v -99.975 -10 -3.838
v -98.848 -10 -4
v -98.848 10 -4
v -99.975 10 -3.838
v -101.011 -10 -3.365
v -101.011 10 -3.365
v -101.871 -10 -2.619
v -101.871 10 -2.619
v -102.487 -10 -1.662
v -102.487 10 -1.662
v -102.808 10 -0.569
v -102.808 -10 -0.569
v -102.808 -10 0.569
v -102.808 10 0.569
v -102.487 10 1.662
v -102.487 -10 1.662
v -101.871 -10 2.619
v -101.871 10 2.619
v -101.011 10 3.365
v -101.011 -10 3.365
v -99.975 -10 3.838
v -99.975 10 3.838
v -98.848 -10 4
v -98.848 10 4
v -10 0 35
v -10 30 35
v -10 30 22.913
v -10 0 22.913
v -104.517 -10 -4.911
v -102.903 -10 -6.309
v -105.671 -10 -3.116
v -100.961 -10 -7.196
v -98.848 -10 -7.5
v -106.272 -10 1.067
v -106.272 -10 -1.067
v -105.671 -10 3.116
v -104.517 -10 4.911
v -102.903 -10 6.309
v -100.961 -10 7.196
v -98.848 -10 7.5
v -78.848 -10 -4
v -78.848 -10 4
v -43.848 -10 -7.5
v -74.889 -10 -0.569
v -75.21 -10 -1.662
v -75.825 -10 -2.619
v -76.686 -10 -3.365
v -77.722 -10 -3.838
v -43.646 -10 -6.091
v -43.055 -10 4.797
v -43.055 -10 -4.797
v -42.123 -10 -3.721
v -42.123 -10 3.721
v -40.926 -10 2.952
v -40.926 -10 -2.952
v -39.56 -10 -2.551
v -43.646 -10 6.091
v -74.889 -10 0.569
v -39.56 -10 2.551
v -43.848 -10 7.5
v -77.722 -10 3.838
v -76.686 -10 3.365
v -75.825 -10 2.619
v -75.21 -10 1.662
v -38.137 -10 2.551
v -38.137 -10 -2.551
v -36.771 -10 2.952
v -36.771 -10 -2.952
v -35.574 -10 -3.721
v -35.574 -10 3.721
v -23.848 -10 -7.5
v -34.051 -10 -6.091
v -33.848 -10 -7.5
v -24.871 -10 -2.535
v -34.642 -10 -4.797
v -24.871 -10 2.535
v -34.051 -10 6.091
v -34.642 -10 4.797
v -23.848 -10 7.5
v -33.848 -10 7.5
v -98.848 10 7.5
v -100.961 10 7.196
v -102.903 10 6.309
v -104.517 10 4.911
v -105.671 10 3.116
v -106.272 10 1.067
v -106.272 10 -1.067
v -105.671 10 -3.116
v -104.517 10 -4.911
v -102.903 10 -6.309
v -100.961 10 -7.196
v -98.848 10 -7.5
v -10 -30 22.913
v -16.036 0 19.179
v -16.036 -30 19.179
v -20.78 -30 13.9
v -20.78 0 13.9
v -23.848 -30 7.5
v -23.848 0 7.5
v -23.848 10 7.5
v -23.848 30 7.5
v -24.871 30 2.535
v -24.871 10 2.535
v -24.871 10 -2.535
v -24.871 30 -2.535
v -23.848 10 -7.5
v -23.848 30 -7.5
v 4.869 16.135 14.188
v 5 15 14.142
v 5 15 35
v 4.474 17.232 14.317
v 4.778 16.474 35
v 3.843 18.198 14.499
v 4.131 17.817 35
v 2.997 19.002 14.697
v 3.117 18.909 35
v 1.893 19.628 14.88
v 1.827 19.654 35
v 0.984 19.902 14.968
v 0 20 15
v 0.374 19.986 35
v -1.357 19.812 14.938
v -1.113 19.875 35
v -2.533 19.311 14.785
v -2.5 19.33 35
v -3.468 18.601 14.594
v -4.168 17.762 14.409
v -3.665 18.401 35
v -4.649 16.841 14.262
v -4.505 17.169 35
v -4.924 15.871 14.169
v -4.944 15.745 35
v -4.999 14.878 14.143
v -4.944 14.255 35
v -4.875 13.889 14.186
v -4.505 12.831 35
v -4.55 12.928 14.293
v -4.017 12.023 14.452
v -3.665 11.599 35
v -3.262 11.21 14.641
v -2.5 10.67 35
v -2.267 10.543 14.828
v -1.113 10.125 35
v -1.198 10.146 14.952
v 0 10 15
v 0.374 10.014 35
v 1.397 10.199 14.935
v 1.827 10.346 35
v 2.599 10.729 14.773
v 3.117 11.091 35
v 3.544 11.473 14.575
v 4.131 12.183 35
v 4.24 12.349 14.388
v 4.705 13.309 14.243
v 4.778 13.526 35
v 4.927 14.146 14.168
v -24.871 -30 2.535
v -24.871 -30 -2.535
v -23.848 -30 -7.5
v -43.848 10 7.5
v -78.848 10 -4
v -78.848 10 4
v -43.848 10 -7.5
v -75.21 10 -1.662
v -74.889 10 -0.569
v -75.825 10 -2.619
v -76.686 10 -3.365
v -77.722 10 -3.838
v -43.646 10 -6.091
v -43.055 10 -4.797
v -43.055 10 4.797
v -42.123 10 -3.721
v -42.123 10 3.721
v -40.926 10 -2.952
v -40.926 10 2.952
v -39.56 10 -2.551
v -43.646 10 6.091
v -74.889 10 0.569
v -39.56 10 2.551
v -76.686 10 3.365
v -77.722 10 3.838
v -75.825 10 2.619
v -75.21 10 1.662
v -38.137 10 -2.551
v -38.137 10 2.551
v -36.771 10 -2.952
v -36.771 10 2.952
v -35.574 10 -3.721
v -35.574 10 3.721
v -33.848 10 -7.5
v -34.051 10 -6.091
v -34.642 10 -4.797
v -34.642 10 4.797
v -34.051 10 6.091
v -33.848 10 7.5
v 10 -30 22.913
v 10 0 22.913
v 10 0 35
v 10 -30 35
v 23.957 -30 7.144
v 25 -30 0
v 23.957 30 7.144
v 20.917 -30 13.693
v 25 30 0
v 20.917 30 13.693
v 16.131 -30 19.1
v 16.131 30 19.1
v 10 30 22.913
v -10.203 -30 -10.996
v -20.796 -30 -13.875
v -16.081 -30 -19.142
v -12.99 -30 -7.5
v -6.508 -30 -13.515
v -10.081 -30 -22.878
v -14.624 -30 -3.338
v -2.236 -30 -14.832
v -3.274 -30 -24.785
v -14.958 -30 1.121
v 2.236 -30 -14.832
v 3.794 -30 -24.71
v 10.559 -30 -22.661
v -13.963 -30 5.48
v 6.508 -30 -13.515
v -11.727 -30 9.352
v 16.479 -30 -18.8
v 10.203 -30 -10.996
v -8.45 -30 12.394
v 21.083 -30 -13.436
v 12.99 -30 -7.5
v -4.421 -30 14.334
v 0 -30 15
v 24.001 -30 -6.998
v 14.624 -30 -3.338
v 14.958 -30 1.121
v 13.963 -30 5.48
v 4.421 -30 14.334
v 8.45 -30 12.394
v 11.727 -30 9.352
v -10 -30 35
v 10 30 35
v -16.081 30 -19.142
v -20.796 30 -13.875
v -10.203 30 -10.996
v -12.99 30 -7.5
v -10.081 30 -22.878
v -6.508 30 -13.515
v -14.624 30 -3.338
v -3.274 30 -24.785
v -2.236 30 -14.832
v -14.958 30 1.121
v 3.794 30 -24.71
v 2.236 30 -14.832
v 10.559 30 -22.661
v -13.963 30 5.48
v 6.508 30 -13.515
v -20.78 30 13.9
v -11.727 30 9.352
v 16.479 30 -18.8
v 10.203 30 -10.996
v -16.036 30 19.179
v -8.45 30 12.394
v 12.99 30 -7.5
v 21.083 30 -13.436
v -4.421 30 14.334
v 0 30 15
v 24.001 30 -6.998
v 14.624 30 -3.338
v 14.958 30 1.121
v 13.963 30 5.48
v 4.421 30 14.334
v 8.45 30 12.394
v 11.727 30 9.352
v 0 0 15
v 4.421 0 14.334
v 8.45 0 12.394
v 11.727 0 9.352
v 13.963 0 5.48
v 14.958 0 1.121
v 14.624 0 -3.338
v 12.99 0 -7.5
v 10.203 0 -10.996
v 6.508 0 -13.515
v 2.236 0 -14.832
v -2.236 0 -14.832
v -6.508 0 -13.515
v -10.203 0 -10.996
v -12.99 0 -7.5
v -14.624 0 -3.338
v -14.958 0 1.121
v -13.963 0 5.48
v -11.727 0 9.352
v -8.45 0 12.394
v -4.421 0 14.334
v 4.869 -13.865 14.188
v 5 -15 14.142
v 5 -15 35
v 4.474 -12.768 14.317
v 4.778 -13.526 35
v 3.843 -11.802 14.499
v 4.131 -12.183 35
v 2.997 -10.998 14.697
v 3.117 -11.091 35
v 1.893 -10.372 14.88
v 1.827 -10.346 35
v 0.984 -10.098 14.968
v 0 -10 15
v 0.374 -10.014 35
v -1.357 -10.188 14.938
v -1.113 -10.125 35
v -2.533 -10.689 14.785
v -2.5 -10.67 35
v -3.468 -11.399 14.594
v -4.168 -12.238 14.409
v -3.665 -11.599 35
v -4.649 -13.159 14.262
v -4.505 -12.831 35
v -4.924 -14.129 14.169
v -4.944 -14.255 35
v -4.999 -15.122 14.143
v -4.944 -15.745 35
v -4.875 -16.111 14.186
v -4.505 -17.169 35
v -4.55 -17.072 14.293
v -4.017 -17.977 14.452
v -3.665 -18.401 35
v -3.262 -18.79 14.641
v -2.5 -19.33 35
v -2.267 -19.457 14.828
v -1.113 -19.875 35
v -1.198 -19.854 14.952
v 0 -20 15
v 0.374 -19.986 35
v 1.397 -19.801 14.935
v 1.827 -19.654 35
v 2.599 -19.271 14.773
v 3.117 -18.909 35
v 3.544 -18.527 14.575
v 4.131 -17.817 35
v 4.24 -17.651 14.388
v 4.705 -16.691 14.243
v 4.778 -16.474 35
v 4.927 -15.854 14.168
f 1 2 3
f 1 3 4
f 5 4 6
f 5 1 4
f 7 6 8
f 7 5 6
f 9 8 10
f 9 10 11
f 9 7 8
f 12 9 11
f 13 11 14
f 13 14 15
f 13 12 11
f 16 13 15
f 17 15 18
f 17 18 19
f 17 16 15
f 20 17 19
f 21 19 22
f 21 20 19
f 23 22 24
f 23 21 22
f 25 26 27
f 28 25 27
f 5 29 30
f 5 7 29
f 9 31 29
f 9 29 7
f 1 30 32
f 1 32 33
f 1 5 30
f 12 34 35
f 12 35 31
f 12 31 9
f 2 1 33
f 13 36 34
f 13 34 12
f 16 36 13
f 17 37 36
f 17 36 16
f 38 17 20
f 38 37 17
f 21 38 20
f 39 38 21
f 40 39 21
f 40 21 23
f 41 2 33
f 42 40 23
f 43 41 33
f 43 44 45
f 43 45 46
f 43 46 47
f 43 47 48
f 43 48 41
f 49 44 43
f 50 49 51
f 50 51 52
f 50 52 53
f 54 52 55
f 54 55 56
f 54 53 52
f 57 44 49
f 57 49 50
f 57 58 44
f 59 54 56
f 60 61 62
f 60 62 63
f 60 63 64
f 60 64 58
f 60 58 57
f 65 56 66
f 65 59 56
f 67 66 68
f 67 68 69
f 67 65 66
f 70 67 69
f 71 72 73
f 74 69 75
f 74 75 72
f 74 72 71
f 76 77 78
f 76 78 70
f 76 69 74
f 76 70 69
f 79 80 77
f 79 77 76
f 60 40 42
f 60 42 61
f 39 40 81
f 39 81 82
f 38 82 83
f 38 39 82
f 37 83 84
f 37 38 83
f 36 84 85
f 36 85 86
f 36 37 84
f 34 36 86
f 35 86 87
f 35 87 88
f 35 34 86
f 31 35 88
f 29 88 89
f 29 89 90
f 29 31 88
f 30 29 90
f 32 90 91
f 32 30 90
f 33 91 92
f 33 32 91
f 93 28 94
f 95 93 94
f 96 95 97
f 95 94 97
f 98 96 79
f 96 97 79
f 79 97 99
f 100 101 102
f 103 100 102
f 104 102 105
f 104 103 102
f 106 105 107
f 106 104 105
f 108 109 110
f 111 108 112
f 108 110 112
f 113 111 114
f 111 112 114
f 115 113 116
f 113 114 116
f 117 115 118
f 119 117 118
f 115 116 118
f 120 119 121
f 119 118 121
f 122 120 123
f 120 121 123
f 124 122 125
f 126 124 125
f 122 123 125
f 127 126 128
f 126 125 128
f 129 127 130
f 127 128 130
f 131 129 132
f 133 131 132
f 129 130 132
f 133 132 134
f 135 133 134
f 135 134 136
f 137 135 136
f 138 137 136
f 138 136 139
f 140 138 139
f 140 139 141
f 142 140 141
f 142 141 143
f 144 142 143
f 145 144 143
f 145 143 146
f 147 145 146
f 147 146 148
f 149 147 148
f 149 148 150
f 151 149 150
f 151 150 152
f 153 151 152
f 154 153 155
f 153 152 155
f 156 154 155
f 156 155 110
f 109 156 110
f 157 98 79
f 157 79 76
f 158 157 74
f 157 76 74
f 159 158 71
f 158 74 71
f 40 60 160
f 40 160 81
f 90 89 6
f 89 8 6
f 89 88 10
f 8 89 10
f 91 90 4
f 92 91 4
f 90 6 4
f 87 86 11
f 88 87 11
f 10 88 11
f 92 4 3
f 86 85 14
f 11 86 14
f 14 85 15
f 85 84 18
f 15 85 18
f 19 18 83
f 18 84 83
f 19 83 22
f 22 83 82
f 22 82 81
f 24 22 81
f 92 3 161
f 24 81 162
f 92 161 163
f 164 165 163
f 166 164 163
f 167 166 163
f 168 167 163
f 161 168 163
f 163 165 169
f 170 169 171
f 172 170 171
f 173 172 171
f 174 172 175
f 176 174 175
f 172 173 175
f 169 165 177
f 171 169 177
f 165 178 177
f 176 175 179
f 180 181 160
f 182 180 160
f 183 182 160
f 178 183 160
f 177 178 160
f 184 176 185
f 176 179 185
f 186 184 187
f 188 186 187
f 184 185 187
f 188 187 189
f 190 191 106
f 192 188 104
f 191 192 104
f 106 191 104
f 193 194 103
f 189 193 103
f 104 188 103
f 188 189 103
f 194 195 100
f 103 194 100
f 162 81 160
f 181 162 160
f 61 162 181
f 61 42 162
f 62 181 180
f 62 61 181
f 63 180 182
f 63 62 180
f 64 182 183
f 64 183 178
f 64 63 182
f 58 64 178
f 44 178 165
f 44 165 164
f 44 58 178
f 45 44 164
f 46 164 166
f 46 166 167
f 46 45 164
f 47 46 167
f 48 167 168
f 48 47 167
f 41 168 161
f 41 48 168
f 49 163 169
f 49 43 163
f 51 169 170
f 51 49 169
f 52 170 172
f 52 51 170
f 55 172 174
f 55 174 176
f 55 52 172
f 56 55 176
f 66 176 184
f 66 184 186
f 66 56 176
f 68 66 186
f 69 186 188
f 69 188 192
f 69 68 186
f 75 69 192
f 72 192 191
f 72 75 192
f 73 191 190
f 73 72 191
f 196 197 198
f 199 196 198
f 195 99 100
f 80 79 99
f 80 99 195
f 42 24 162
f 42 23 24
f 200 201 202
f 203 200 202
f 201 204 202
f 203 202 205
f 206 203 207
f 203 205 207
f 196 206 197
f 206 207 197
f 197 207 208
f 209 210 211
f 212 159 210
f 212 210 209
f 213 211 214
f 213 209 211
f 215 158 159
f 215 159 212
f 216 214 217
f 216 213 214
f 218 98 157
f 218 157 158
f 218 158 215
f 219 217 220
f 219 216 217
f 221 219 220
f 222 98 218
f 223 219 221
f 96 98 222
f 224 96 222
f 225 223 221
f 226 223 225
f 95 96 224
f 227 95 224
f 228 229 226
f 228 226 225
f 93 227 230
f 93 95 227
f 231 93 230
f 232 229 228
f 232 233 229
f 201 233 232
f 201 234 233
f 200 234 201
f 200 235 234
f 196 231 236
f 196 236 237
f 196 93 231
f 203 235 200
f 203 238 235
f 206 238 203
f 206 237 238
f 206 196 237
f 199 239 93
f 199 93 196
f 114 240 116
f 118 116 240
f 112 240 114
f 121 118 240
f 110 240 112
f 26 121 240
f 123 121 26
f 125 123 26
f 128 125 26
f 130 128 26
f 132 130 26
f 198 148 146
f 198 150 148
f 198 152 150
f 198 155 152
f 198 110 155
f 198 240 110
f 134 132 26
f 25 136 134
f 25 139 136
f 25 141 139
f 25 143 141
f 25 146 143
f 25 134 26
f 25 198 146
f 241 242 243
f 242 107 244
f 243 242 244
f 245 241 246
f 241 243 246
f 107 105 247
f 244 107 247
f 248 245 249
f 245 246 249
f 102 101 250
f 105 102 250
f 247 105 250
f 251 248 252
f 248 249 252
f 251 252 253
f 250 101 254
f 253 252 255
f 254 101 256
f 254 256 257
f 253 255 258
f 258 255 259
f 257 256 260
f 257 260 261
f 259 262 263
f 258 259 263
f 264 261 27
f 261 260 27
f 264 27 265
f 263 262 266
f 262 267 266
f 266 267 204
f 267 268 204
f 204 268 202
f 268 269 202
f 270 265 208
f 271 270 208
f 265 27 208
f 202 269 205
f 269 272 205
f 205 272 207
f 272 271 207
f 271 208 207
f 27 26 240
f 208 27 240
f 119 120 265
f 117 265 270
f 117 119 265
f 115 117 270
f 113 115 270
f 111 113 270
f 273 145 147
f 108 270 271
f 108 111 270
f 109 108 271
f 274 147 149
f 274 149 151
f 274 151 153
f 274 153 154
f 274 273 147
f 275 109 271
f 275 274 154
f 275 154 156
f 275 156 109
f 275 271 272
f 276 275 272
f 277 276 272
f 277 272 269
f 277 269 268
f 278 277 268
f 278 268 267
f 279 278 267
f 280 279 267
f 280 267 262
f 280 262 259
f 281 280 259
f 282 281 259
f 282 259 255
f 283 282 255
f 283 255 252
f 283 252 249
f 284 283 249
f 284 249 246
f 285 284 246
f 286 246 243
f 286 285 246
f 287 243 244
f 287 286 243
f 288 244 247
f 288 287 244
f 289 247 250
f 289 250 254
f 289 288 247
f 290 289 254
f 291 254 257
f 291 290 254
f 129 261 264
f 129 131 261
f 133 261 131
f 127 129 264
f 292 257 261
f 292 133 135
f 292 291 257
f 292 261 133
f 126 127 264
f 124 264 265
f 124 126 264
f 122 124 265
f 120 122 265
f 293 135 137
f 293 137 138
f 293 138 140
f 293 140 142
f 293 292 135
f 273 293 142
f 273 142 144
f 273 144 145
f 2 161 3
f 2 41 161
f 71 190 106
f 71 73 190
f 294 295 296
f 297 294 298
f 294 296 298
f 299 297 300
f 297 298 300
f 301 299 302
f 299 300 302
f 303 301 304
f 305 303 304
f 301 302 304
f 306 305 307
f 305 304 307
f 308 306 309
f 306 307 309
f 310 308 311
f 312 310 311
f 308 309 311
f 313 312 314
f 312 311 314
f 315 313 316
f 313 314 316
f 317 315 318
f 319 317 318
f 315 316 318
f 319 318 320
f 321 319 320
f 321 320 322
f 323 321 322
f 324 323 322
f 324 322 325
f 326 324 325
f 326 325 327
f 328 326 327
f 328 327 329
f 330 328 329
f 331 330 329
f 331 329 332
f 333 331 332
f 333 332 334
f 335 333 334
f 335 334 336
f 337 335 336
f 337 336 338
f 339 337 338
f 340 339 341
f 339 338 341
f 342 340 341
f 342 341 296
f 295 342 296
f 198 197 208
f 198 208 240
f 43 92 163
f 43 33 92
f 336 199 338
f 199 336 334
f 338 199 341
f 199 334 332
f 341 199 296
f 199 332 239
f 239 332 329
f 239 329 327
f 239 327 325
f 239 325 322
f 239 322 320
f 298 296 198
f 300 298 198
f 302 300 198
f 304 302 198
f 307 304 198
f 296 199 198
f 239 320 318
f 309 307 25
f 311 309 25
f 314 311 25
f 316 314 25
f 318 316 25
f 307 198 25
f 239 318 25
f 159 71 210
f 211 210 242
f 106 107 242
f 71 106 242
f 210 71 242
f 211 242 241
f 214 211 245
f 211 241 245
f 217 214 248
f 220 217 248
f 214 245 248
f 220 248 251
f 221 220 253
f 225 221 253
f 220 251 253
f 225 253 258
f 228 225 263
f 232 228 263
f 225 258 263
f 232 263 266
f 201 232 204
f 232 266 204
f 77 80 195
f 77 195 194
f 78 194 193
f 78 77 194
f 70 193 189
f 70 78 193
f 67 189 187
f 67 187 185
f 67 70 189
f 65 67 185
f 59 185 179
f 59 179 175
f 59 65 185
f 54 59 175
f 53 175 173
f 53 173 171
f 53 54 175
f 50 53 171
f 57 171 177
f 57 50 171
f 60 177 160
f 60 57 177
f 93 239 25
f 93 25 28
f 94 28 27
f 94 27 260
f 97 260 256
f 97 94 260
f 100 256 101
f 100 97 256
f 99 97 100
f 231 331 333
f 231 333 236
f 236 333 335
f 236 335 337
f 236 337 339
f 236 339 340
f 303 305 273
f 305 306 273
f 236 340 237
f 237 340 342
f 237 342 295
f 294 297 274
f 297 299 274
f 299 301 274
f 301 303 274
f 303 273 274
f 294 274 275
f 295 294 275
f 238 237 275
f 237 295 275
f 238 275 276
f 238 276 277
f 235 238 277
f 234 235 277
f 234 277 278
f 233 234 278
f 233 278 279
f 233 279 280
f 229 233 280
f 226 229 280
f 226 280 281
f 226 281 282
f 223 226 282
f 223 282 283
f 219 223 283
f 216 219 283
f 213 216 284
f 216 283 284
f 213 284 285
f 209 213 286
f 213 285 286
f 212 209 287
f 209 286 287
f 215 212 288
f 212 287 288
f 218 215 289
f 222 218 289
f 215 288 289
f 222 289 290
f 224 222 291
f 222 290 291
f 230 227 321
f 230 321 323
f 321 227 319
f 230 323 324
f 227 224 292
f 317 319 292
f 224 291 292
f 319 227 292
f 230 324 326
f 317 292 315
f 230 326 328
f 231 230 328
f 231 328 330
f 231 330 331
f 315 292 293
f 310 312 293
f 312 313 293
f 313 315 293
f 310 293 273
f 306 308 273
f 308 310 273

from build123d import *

# Parameters (mm, degrees)
F1_DEPTH = 30
F2_DEPTH = 10
F3_R     = 5
F4_DEPTH = 20.8588644763


with BuildPart() as f1:
    # F0 (on Front) → F1 (new body, symmetric)
    with BuildSketch(Plane.XZ):
        with BuildLine():
            ThreePointArc((-10, 22.9128784748), (-18.5962121384, 16.7087071344), (-23.8484800354, 7.5))
            Line((-23.8484800354, 7.5), (-23.8484800354, -7.5))
            ThreePointArc((-23.8484800354, -7.5), (3.7939424821, -24.7104431454), (25, 0))
            ThreePointArc((25, 0), (20.9165006634, 13.6930639376), (10, 22.9128784748))
            Line((10, 22.9128784748), (10, 15))
            Line((10, 15), (0, 15))
            Line((0, 15), (-10, 15))
            Line((-10, 15), (-10, 22.9128784748))
        make_face()
        with BuildLine():
            ThreePointArc((15, 0), (-10.6066017178, -10.6066017178), (0, 15))
            ThreePointArc((0, 15), (10.6066017178, 10.6066017178), (15, 0))
        make_face(mode=Mode.SUBTRACT)
        with BuildLine():
            ThreePointArc((10, 22.9128784748), (0, 25), (-10, 22.9128784748))
            Line((-10, 22.9128784748), (-10, 15))
            Line((-10, 15), (0, 15))
            Line((0, 15), (10, 15))
            Line((10, 15), (10, 22.9128784748))
        make_face()
        with BuildLine():
            Line((-23.8484800354, -7.5), (-23.8484800354, 7.5))
            ThreePointArc((-23.8484800354, 7.5), (-25, 0), (-23.8484800354, -7.5))
        make_face()
        with BuildLine():
            Line((-10, 35), (-10, 22.9128784748))
            ThreePointArc((-10, 22.9128784748), (0, 25), (10, 22.9128784748))
            Line((10, 22.9128784748), (10, 35))
            Line((10, 35), (-10, 35))
        make_face()
    extrude(amount=F1_DEPTH, both=True)

    # F0 (on Front) → F2 (join, symmetric)
    with BuildSketch(Plane.XZ):
        with BuildLine():
            ThreePointArc((-23.8484800354, -7.5), (-25, 0), (-23.8484800354, 7.5))
            Line((-23.8484800354, 7.5), (-33.8484800354, 7.5))
            ThreePointArc((-33.8484800354, 7.5), (-38.8484800354, 2.5), (-43.8484800354, 7.5))
            Line((-43.8484800354, 7.5), (-98.8484800354, 7.5))
            ThreePointArc((-98.8484800354, 7.5), (-106.3484800354, 0), (-98.8484800354, -7.5))
            Line((-98.8484800354, -7.5), (-43.8484800354, -7.5))
            ThreePointArc((-43.8484800354, -7.5), (-38.8484800354, -2.5), (-33.8484800354, -7.5))
            Line((-33.8484800354, -7.5), (-23.8484800354, -7.5))
        make_face()
        with BuildLine():
            ThreePointArc((-98.8484800354, -4), (-102.8484800354, 0), (-98.8484800354, 4))
            Line((-98.8484800354, 4), (-78.8484800354, 4))
            ThreePointArc((-78.8484800354, 4), (-74.8484800354, 0), (-78.8484800354, -4))
            Line((-78.8484800354, -4), (-98.8484800354, -4))
        make_face(mode=Mode.SUBTRACT)
    extrude(amount=F2_DEPTH, both=True)

    # F3 (on face) → F4 (cut, through all)
    with BuildSketch(Plane.XY.offset(35)):
        with Locations((0, 15)):
            Circle(F3_R)
        with Locations((0, -15)):
            Circle(F3_R)
    extrude(amount=-F4_DEPTH, mode=Mode.SUBTRACT)


solid = f1.part
